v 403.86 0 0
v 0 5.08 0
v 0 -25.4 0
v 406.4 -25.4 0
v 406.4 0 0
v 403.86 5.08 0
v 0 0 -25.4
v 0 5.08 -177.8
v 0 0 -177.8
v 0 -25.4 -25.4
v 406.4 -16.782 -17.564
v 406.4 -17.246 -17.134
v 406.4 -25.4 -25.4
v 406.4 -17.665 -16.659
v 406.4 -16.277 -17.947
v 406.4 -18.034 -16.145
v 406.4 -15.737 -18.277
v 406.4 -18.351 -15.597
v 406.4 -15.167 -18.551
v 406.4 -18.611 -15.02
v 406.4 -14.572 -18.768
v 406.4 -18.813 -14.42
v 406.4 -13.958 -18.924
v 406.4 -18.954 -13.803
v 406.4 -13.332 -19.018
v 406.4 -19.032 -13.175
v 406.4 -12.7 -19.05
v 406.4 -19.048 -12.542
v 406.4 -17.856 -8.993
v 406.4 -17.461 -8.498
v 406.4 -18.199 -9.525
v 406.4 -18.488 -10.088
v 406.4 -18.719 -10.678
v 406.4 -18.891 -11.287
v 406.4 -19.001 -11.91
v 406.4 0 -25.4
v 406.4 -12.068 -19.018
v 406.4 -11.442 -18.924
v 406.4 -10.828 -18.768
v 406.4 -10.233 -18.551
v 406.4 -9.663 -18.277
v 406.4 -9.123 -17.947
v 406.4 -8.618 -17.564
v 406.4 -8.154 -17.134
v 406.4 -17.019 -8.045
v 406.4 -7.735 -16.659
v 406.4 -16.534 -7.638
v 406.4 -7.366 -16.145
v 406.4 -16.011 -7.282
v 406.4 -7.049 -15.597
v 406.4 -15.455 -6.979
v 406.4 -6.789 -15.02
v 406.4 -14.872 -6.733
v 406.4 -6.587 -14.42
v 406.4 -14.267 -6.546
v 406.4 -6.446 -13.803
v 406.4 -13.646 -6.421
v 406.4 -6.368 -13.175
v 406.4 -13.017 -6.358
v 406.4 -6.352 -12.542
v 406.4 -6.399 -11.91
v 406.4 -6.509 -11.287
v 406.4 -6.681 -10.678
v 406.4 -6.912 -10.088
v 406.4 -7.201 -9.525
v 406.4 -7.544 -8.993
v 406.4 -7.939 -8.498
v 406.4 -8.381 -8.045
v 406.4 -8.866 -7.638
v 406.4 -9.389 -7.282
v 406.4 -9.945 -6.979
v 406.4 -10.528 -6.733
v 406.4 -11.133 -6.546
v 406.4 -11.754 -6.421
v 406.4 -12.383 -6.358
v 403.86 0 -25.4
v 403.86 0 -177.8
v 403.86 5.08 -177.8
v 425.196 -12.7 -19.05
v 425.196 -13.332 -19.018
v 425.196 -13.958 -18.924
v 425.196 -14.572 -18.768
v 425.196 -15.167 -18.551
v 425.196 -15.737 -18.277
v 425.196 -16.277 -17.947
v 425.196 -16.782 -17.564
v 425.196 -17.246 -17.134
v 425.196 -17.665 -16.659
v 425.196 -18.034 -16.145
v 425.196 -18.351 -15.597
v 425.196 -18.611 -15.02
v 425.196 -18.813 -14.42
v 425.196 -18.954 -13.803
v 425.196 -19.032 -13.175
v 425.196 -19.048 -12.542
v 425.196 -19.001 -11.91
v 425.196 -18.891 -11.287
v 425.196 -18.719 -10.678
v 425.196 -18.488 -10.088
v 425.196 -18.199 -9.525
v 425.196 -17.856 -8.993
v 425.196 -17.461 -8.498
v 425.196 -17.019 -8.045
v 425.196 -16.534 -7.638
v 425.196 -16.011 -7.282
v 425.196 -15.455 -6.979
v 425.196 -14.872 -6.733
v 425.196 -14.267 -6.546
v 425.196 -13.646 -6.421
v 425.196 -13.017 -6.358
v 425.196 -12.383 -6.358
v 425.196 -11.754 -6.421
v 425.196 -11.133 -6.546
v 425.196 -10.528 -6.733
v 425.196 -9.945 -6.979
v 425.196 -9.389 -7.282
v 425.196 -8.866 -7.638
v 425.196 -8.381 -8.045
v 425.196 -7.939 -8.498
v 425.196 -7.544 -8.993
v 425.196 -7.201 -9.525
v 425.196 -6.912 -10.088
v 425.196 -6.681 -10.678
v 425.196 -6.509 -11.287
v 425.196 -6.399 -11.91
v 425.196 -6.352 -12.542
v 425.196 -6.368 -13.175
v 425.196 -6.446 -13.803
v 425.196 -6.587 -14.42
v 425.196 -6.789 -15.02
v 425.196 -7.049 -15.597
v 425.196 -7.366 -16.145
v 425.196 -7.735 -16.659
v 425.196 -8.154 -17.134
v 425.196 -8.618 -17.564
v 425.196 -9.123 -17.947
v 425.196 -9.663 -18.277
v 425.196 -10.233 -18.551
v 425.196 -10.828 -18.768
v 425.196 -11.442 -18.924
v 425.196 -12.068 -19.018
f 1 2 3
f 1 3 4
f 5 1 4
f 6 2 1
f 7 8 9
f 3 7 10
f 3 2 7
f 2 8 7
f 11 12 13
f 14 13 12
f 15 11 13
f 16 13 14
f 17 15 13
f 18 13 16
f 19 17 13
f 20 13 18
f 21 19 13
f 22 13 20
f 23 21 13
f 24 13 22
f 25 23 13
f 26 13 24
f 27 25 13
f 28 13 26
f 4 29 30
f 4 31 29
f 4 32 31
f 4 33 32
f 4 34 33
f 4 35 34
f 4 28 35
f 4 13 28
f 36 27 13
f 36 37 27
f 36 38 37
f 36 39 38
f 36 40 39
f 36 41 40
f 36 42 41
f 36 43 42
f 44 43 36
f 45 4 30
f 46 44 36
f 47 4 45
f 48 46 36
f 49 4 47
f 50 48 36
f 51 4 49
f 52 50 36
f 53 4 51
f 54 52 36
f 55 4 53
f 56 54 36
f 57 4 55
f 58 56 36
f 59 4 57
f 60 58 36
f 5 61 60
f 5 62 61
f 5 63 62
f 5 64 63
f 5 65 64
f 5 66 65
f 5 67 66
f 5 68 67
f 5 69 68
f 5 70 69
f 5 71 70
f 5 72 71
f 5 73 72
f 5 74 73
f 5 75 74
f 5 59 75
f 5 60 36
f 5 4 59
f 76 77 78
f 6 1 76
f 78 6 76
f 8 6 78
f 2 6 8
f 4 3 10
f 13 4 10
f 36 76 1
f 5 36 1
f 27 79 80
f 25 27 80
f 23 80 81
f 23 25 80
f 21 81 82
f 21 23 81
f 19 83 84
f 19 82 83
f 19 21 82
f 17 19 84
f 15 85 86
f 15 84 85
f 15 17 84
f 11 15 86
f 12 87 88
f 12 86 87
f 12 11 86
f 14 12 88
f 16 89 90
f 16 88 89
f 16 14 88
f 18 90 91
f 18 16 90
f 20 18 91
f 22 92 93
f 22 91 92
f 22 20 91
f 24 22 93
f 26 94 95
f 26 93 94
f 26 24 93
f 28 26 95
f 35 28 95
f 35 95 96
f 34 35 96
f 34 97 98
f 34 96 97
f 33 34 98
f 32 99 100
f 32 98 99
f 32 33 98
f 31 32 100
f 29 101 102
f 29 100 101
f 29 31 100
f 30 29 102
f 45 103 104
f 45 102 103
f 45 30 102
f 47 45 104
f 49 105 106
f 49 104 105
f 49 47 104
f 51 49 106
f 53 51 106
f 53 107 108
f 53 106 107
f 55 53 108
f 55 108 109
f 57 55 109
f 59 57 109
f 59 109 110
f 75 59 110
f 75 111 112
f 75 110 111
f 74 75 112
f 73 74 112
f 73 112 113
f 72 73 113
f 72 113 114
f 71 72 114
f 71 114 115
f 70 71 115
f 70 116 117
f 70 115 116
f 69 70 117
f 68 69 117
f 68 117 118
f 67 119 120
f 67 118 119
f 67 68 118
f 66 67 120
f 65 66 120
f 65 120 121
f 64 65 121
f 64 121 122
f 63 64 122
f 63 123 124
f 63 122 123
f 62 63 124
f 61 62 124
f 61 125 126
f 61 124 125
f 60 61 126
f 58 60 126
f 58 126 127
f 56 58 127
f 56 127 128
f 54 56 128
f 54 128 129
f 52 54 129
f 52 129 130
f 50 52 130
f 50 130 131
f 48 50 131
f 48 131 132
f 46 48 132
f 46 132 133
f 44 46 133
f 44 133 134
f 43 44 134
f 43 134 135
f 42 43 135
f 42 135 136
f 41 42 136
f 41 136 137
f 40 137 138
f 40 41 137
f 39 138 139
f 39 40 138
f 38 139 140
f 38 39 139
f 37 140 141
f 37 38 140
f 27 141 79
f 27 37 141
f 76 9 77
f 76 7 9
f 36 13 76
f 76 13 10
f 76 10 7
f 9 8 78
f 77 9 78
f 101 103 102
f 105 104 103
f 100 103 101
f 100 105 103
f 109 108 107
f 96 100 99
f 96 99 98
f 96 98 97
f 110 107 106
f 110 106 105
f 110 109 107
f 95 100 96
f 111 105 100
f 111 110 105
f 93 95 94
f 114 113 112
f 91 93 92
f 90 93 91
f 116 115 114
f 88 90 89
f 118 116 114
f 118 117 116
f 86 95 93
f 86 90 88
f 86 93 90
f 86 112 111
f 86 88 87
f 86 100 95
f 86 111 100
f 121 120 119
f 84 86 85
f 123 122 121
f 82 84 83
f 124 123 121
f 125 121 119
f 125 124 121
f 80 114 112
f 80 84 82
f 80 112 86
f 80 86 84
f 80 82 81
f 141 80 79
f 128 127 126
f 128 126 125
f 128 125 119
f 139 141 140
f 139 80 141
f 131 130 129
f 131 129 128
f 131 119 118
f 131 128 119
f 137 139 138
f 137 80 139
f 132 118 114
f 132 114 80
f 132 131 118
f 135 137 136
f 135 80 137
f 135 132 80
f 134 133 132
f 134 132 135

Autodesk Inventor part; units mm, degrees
ref_plane "YZ Plane" through (0, 0, 0) normal (1, 0, 0) x (0, 1, 0)
ref_plane "XZ Plane" through (0, 0, 0) normal (0, 1, 0) x (-1, 0, 0)
ref_plane "XY Plane" through (0, 0, 0) normal (0, 0, 1) x (1, 0, 0)
sketch "Sketch1" plane through (0, 0, 0) normal (1, 0, 0) x (0, 1, 0)
  line L0 (0, 0) -> (-25.4, 0)
  line L1 (-25.4, 0) -> (-25.4, -25.4)
  line L2 (-25.4, -25.4) -> (0, -25.4)
  line L3 (0, -25.4) -> (0, 0)
  dimension "d0" = 25.4
  dimension "d1" = 25.4
extrude "Extrusion1" add sketch "Sketch1" along normal blind 406.4
sketch "Sketch2" plane through (406.4, 0, 0) normal (1, 0, 0) x (0, 0, -1)
  circle A0 centre (12.7, -12.7) radius 6.35
  line L0 (12.7, -12.7) -> (12.7, 0) construction
  line L1 (25.4, 0) -> (0, 0) projected
  dimension "d4" = 12.7
  dimension "d11" = 12.7
extrude "Extrusion2" add sketch "Sketch2" along normal blind 18.796
sketch "Sketch3" plane through (0, 0, 0) normal (-1, 0, 0) x (0, 0, 1)
  circle A0 centre (-12.7, -12.7) radius 6.35
  line L0 (-12.7, -12.7) -> (-12.7, 0) construction
  line L1 (-25.4, 0) -> (0, 0) construction
  line L2 (0, 0) -> (0, -25.4) construction
  dimension "d9" = 12.7
  dimension "d10" = 12.7
extrude "Extrusion3" add sketch "Sketch3" against normal blind 19.05
sketch "Sketch4" plane through (0, -25.4, 0) normal (0, 0, 1) x (1, 0, 0)
  line L0 (0, 25.4) -> (403.86, 25.4)
  line L1 (403.86, 25.4) -> (403.86, 30.48)
  line L2 (403.86, 30.48) -> (0, 30.48)
  line L3 (0, 30.48) -> (0, 25.4)
  dimension "d12" = 5.08
  dimension "d15" = 403.86
extrude "Extrusion4" add sketch "Sketch4" against normal blind 177.8
properties part number "hopper_bar"
